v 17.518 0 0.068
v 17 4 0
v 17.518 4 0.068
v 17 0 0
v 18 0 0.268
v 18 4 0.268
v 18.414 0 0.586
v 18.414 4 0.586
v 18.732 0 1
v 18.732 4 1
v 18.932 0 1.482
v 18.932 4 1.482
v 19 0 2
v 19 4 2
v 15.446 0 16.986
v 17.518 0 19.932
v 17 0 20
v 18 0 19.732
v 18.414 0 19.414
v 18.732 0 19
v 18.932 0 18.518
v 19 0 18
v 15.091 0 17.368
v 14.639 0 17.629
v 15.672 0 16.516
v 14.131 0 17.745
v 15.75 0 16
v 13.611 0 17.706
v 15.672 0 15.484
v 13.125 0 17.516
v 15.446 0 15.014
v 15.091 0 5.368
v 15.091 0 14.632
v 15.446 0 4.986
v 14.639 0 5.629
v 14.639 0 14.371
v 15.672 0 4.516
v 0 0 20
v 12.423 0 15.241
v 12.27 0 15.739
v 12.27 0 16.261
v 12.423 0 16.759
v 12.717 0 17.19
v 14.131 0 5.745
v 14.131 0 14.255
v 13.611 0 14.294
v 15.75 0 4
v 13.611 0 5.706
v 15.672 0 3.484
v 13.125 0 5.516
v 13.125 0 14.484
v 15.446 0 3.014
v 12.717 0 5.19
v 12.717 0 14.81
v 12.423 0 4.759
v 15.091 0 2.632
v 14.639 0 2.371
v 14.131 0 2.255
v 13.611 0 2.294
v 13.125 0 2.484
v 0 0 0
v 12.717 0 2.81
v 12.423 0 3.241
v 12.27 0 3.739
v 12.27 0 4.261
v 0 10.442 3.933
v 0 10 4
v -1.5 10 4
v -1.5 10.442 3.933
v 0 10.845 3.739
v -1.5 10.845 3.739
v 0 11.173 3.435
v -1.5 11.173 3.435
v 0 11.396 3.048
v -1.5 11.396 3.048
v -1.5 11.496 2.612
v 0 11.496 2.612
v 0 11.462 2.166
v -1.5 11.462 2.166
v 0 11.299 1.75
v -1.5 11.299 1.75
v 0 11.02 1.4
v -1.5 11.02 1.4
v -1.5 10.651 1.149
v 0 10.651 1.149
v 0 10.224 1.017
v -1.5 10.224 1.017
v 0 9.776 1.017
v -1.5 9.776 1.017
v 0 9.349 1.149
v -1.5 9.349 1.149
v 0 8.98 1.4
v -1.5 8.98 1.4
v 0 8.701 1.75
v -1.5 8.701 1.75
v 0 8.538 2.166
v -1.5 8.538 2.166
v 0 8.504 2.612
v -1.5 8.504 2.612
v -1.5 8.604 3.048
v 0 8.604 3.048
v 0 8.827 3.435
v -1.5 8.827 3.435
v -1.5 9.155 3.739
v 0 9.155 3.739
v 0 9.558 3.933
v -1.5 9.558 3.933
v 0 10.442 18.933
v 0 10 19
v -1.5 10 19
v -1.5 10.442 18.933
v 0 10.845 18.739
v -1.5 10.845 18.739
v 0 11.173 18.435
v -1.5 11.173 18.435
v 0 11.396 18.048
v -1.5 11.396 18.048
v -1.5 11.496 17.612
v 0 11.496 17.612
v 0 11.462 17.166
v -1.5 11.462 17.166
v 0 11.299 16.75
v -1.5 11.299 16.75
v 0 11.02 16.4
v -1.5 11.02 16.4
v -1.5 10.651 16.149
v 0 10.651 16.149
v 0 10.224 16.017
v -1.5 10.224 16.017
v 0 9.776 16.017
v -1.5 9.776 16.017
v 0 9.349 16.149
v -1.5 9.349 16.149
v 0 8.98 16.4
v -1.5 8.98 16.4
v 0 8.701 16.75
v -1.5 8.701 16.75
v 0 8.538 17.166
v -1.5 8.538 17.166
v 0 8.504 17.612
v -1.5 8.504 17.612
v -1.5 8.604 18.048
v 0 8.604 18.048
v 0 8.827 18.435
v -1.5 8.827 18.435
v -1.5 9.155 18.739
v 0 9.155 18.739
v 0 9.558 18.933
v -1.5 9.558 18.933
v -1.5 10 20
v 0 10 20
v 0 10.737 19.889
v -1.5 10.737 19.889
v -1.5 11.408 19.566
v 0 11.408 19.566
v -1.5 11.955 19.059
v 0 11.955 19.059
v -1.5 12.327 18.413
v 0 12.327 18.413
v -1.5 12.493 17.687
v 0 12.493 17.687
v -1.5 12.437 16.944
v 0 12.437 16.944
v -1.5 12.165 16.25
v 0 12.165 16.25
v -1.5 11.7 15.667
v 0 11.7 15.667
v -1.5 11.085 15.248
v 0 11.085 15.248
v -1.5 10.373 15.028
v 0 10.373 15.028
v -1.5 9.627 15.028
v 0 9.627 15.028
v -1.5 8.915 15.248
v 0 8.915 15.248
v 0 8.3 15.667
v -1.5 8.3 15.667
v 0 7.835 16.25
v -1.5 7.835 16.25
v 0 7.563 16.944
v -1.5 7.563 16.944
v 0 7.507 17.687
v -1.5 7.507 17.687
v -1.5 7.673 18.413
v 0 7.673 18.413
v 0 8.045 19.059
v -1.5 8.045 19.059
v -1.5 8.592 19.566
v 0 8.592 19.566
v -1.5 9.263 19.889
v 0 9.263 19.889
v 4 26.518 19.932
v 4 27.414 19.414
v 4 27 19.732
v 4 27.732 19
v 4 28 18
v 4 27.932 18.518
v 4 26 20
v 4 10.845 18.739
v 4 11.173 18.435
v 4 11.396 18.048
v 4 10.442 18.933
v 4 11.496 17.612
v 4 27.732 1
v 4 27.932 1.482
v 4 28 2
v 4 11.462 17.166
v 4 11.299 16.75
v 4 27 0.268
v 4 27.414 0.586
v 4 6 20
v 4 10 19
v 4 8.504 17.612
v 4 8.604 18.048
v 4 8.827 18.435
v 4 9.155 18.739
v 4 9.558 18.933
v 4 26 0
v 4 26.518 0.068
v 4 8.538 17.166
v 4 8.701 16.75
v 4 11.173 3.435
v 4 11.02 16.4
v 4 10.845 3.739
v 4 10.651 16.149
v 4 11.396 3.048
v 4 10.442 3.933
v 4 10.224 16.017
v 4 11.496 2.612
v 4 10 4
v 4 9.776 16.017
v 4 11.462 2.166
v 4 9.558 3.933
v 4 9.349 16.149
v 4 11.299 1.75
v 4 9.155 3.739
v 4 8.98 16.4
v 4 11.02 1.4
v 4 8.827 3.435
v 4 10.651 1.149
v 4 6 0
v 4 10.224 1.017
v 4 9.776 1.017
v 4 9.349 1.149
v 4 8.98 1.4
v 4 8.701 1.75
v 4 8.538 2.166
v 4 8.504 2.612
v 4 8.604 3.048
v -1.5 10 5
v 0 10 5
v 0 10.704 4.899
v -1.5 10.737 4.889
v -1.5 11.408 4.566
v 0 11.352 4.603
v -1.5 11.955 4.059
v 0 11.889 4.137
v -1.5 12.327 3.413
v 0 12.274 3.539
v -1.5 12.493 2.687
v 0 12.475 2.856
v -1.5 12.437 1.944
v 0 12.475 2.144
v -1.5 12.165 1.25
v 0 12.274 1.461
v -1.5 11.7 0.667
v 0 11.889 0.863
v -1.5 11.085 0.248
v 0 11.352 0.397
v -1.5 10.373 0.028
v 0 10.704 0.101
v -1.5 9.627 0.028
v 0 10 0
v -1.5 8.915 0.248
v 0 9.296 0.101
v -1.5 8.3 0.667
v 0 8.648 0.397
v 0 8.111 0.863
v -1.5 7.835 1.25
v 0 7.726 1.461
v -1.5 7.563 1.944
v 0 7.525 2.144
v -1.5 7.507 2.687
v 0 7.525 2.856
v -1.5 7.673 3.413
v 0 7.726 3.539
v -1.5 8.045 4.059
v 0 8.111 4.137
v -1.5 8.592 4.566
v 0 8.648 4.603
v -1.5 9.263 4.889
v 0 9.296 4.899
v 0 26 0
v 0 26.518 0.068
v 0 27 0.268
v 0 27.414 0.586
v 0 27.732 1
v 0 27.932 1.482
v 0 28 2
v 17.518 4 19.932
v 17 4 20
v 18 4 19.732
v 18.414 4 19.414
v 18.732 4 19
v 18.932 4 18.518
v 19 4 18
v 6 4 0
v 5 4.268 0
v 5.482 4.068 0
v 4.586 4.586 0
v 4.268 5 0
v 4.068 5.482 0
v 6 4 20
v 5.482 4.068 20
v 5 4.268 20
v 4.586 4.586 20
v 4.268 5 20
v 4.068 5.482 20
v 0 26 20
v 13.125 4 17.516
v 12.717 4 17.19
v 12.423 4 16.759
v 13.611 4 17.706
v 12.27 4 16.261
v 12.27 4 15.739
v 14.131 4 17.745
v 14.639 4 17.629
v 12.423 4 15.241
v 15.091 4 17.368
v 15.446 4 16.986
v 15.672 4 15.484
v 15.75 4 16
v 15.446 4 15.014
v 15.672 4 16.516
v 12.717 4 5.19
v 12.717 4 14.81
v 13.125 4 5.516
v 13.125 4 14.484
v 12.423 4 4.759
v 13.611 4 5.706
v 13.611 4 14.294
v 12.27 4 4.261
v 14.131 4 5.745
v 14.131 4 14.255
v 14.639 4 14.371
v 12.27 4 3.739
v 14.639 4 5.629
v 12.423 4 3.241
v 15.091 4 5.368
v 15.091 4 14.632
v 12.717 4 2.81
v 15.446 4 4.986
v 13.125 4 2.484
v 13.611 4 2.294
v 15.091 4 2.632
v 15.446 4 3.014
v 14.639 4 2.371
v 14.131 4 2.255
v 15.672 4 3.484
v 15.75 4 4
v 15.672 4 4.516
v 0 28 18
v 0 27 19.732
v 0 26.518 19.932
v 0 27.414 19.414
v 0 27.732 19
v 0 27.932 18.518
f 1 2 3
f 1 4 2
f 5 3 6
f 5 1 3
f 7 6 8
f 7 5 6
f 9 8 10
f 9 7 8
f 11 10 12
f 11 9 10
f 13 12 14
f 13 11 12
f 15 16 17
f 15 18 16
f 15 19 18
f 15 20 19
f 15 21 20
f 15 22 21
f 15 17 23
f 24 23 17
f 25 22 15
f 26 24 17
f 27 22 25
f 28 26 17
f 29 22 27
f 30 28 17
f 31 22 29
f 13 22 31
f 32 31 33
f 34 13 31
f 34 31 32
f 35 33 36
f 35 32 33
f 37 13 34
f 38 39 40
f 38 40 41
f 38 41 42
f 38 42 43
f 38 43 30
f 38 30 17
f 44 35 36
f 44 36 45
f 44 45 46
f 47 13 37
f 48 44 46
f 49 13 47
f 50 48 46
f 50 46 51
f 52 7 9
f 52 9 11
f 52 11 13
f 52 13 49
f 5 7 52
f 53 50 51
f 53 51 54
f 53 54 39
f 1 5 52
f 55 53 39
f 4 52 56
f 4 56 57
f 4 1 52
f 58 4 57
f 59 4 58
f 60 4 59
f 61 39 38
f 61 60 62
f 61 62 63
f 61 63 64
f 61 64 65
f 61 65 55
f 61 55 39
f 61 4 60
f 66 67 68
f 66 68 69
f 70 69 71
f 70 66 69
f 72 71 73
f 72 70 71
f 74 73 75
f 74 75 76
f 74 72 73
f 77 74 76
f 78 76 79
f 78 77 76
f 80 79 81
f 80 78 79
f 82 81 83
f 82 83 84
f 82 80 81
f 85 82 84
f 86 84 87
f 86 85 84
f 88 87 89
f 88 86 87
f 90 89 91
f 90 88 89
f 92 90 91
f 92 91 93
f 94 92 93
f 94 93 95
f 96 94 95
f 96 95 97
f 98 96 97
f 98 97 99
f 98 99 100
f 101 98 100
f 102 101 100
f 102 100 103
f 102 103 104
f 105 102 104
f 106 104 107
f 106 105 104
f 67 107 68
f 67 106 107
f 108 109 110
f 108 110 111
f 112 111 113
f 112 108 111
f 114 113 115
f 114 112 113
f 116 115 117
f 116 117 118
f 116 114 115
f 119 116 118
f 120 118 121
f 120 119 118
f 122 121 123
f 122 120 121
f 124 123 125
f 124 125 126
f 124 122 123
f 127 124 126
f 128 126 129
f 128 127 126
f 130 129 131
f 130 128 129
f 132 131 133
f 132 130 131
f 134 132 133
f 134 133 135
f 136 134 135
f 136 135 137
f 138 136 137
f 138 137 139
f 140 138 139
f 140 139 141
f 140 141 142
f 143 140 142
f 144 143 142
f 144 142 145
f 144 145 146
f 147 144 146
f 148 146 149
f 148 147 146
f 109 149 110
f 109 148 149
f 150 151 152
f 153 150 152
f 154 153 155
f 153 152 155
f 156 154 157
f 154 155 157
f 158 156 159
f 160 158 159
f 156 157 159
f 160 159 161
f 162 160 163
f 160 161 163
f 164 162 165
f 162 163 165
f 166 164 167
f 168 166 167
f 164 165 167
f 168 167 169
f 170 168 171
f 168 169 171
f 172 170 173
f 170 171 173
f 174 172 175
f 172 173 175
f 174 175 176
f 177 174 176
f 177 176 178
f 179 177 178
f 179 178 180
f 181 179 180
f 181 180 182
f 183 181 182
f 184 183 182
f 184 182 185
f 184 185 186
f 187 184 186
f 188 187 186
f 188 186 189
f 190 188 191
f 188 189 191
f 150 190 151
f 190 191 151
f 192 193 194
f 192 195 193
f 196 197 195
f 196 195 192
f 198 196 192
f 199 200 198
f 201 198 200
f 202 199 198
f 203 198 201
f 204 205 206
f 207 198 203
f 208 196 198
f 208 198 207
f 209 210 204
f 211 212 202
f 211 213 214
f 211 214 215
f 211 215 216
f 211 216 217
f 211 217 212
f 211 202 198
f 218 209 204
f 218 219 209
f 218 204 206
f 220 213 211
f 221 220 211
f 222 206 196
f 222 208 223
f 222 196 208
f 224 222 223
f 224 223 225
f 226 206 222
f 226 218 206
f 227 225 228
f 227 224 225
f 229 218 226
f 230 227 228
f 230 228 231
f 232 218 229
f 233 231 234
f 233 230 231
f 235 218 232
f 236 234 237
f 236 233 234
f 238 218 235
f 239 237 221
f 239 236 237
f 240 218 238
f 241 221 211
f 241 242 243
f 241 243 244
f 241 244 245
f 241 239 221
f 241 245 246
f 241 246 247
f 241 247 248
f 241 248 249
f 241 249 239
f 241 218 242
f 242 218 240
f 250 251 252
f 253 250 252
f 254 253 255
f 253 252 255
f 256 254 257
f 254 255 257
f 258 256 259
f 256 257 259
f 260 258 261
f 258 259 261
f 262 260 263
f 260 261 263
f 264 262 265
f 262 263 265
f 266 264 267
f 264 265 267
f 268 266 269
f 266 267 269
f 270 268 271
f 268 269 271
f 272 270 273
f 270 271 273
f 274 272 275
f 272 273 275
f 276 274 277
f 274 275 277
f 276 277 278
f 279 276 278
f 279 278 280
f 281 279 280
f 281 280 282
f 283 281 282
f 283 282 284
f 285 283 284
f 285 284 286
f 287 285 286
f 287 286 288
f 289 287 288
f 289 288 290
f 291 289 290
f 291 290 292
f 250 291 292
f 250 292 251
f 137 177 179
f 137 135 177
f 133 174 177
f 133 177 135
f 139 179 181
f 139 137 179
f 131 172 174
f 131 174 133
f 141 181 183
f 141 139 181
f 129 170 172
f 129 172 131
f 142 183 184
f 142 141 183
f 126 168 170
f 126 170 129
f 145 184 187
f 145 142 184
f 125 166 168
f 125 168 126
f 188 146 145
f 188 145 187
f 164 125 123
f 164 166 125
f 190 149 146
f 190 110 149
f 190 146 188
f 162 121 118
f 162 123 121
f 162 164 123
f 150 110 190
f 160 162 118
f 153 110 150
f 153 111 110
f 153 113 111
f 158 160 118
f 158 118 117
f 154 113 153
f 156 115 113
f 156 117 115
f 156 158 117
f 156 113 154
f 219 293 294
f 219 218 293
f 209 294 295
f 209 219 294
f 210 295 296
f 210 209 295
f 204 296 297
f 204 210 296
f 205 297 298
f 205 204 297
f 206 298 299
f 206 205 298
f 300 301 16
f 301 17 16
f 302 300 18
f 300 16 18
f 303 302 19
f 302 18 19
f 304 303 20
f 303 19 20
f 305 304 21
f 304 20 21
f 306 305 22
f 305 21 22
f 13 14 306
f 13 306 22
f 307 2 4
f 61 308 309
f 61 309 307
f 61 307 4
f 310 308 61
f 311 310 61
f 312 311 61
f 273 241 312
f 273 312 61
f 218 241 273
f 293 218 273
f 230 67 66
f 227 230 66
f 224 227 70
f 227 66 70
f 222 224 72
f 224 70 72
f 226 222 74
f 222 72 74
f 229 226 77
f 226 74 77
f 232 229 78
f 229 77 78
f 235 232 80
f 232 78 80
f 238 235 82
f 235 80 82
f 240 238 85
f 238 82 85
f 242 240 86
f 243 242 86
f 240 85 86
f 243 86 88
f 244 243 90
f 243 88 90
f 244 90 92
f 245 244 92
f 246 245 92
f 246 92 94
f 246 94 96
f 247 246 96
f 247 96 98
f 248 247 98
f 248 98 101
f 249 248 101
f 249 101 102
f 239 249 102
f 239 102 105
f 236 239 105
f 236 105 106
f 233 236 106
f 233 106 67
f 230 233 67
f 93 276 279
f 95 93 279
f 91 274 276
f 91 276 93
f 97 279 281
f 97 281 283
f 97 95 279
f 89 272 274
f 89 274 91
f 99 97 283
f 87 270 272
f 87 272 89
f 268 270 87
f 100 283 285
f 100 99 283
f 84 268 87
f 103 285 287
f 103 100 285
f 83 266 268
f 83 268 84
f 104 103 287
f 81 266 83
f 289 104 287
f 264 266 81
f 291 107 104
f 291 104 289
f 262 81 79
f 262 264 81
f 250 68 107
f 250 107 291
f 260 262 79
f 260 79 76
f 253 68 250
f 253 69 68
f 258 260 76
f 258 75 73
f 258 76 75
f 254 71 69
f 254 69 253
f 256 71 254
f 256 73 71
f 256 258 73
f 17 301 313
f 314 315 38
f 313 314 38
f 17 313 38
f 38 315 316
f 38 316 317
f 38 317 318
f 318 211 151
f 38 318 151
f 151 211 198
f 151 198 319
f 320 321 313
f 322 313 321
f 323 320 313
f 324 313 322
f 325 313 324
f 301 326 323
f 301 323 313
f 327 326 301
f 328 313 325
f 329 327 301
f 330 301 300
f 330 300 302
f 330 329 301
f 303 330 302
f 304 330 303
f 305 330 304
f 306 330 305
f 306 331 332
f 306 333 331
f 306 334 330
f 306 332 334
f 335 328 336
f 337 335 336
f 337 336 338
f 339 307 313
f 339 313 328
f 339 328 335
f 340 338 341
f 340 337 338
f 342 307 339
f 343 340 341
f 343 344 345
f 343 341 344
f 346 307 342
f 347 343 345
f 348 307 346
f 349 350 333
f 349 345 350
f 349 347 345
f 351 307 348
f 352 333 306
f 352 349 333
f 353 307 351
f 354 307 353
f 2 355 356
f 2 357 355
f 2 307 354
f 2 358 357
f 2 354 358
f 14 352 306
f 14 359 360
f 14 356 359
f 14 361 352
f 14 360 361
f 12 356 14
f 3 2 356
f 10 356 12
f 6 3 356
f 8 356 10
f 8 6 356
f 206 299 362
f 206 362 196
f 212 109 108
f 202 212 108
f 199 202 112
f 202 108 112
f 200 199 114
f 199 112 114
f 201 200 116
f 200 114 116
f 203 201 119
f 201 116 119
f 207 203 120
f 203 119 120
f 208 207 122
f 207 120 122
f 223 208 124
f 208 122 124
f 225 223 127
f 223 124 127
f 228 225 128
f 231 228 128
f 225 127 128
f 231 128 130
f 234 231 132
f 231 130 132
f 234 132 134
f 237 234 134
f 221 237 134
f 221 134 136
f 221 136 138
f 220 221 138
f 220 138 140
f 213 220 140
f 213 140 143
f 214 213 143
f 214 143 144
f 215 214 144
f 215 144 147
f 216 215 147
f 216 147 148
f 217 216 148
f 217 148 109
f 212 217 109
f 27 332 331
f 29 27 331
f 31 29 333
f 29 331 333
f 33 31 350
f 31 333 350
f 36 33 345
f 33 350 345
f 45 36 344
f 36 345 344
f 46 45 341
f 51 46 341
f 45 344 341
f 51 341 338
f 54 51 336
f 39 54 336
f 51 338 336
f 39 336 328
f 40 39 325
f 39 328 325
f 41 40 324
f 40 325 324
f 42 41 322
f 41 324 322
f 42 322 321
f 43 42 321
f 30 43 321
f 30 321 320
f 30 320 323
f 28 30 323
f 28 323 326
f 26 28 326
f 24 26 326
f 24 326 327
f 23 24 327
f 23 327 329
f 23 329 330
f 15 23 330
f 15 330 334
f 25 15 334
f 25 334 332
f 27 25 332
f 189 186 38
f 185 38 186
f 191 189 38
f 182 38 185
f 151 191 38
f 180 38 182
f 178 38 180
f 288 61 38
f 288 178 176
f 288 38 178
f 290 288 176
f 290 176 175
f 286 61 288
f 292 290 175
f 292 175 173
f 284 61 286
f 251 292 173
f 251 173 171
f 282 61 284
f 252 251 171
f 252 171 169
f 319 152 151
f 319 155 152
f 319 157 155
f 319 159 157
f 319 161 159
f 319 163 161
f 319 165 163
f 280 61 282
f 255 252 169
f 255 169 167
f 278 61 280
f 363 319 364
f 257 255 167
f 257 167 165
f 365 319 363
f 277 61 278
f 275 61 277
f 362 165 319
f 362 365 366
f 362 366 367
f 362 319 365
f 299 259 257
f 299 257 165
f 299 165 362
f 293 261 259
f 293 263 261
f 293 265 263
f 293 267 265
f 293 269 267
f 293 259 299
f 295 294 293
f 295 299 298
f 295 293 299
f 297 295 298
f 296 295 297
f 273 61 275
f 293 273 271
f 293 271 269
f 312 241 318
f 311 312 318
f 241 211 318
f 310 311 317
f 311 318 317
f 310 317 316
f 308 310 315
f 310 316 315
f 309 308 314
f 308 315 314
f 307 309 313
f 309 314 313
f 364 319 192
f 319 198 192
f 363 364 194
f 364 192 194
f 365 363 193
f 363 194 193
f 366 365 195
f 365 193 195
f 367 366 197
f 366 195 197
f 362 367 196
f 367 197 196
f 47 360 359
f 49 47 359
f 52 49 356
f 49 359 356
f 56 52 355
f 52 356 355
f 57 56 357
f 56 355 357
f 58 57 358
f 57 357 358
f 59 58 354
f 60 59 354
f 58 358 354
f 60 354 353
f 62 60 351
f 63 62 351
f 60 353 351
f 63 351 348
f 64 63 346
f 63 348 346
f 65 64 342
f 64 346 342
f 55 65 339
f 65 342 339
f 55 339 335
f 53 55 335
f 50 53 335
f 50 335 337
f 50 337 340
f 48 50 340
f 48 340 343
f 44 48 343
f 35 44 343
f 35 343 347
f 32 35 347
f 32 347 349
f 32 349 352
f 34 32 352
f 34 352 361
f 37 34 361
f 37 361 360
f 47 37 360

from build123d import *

# Parameters (mm, degrees)
BOSS_EXTRUDE1_DEPTH = 20
SKETCH2_R           = 1.5
CUT_EXTRUDE1_DEPTH  = 20
SKETCH3_R           = 1.75
CUT_EXTRUDE2_DEPTH  = 5
FILLET1_R           = 2
SKETCH4_R           = 2.5
SKETCH4_R_2         = 1.5
BOSS_EXTRUDE2_DEPTH = 1.5


with BuildPart() as part:
    # Sketch1 → Boss-Extrude1 (new body)
    with BuildSketch(Plane.XY):
        Polygon((0, 0), (0, 28), (4, 28), (4, 4), (19, 4), (19, 0), align=None)
    extrude(amount=BOSS_EXTRUDE1_DEPTH)

    # Sketch2 → Cut-Extrude1 (cut, through all)
    with BuildSketch(Plane.ZY):
        with Locations((17.5, 10)):
            Circle(SKETCH2_R)
        with Locations((2.5, 10)):
            Circle(SKETCH2_R)
    extrude(amount=-CUT_EXTRUDE1_DEPTH, mode=Mode.SUBTRACT)

    # Sketch3 → Cut-Extrude2 (cut, through all)
    with BuildSketch(Plane(origin=(0, 4, 0), x_dir=(1, 0, 0), z_dir=(0, 1, 0))):
        with Locations((14, -4)):
            Circle(SKETCH3_R)
        with Locations((14, -16)):
            Circle(SKETCH3_R)
    extrude(amount=-CUT_EXTRUDE2_DEPTH, mode=Mode.SUBTRACT)

    # Fillet1
    fillet1_edges = [part.edges().sort_by_distance(p)[0] for p in [
        (4, 4, 10),
        (2, 28, 20),
        (2, 28, 0),
        (19, 2, 0),
        (19, 2, 20),
    ]]
    fillet(fillet1_edges, radius=FILLET1_R)

    # Sketch4 → Boss-Extrude2 (add)
    with BuildSketch(Plane.ZY):
        with Locations((2.5, 10)):
            Circle(SKETCH4_R)
        with Locations((2.5, 10)):
            Circle(SKETCH4_R_2, mode=Mode.SUBTRACT)
        with Locations((17.5, 10)):
            Circle(SKETCH4_R)
        with Locations((17.5, 10)):
            Circle(SKETCH4_R_2, mode=Mode.SUBTRACT)
    extrude(amount=BOSS_EXTRUDE2_DEPTH)


solid = part.part
